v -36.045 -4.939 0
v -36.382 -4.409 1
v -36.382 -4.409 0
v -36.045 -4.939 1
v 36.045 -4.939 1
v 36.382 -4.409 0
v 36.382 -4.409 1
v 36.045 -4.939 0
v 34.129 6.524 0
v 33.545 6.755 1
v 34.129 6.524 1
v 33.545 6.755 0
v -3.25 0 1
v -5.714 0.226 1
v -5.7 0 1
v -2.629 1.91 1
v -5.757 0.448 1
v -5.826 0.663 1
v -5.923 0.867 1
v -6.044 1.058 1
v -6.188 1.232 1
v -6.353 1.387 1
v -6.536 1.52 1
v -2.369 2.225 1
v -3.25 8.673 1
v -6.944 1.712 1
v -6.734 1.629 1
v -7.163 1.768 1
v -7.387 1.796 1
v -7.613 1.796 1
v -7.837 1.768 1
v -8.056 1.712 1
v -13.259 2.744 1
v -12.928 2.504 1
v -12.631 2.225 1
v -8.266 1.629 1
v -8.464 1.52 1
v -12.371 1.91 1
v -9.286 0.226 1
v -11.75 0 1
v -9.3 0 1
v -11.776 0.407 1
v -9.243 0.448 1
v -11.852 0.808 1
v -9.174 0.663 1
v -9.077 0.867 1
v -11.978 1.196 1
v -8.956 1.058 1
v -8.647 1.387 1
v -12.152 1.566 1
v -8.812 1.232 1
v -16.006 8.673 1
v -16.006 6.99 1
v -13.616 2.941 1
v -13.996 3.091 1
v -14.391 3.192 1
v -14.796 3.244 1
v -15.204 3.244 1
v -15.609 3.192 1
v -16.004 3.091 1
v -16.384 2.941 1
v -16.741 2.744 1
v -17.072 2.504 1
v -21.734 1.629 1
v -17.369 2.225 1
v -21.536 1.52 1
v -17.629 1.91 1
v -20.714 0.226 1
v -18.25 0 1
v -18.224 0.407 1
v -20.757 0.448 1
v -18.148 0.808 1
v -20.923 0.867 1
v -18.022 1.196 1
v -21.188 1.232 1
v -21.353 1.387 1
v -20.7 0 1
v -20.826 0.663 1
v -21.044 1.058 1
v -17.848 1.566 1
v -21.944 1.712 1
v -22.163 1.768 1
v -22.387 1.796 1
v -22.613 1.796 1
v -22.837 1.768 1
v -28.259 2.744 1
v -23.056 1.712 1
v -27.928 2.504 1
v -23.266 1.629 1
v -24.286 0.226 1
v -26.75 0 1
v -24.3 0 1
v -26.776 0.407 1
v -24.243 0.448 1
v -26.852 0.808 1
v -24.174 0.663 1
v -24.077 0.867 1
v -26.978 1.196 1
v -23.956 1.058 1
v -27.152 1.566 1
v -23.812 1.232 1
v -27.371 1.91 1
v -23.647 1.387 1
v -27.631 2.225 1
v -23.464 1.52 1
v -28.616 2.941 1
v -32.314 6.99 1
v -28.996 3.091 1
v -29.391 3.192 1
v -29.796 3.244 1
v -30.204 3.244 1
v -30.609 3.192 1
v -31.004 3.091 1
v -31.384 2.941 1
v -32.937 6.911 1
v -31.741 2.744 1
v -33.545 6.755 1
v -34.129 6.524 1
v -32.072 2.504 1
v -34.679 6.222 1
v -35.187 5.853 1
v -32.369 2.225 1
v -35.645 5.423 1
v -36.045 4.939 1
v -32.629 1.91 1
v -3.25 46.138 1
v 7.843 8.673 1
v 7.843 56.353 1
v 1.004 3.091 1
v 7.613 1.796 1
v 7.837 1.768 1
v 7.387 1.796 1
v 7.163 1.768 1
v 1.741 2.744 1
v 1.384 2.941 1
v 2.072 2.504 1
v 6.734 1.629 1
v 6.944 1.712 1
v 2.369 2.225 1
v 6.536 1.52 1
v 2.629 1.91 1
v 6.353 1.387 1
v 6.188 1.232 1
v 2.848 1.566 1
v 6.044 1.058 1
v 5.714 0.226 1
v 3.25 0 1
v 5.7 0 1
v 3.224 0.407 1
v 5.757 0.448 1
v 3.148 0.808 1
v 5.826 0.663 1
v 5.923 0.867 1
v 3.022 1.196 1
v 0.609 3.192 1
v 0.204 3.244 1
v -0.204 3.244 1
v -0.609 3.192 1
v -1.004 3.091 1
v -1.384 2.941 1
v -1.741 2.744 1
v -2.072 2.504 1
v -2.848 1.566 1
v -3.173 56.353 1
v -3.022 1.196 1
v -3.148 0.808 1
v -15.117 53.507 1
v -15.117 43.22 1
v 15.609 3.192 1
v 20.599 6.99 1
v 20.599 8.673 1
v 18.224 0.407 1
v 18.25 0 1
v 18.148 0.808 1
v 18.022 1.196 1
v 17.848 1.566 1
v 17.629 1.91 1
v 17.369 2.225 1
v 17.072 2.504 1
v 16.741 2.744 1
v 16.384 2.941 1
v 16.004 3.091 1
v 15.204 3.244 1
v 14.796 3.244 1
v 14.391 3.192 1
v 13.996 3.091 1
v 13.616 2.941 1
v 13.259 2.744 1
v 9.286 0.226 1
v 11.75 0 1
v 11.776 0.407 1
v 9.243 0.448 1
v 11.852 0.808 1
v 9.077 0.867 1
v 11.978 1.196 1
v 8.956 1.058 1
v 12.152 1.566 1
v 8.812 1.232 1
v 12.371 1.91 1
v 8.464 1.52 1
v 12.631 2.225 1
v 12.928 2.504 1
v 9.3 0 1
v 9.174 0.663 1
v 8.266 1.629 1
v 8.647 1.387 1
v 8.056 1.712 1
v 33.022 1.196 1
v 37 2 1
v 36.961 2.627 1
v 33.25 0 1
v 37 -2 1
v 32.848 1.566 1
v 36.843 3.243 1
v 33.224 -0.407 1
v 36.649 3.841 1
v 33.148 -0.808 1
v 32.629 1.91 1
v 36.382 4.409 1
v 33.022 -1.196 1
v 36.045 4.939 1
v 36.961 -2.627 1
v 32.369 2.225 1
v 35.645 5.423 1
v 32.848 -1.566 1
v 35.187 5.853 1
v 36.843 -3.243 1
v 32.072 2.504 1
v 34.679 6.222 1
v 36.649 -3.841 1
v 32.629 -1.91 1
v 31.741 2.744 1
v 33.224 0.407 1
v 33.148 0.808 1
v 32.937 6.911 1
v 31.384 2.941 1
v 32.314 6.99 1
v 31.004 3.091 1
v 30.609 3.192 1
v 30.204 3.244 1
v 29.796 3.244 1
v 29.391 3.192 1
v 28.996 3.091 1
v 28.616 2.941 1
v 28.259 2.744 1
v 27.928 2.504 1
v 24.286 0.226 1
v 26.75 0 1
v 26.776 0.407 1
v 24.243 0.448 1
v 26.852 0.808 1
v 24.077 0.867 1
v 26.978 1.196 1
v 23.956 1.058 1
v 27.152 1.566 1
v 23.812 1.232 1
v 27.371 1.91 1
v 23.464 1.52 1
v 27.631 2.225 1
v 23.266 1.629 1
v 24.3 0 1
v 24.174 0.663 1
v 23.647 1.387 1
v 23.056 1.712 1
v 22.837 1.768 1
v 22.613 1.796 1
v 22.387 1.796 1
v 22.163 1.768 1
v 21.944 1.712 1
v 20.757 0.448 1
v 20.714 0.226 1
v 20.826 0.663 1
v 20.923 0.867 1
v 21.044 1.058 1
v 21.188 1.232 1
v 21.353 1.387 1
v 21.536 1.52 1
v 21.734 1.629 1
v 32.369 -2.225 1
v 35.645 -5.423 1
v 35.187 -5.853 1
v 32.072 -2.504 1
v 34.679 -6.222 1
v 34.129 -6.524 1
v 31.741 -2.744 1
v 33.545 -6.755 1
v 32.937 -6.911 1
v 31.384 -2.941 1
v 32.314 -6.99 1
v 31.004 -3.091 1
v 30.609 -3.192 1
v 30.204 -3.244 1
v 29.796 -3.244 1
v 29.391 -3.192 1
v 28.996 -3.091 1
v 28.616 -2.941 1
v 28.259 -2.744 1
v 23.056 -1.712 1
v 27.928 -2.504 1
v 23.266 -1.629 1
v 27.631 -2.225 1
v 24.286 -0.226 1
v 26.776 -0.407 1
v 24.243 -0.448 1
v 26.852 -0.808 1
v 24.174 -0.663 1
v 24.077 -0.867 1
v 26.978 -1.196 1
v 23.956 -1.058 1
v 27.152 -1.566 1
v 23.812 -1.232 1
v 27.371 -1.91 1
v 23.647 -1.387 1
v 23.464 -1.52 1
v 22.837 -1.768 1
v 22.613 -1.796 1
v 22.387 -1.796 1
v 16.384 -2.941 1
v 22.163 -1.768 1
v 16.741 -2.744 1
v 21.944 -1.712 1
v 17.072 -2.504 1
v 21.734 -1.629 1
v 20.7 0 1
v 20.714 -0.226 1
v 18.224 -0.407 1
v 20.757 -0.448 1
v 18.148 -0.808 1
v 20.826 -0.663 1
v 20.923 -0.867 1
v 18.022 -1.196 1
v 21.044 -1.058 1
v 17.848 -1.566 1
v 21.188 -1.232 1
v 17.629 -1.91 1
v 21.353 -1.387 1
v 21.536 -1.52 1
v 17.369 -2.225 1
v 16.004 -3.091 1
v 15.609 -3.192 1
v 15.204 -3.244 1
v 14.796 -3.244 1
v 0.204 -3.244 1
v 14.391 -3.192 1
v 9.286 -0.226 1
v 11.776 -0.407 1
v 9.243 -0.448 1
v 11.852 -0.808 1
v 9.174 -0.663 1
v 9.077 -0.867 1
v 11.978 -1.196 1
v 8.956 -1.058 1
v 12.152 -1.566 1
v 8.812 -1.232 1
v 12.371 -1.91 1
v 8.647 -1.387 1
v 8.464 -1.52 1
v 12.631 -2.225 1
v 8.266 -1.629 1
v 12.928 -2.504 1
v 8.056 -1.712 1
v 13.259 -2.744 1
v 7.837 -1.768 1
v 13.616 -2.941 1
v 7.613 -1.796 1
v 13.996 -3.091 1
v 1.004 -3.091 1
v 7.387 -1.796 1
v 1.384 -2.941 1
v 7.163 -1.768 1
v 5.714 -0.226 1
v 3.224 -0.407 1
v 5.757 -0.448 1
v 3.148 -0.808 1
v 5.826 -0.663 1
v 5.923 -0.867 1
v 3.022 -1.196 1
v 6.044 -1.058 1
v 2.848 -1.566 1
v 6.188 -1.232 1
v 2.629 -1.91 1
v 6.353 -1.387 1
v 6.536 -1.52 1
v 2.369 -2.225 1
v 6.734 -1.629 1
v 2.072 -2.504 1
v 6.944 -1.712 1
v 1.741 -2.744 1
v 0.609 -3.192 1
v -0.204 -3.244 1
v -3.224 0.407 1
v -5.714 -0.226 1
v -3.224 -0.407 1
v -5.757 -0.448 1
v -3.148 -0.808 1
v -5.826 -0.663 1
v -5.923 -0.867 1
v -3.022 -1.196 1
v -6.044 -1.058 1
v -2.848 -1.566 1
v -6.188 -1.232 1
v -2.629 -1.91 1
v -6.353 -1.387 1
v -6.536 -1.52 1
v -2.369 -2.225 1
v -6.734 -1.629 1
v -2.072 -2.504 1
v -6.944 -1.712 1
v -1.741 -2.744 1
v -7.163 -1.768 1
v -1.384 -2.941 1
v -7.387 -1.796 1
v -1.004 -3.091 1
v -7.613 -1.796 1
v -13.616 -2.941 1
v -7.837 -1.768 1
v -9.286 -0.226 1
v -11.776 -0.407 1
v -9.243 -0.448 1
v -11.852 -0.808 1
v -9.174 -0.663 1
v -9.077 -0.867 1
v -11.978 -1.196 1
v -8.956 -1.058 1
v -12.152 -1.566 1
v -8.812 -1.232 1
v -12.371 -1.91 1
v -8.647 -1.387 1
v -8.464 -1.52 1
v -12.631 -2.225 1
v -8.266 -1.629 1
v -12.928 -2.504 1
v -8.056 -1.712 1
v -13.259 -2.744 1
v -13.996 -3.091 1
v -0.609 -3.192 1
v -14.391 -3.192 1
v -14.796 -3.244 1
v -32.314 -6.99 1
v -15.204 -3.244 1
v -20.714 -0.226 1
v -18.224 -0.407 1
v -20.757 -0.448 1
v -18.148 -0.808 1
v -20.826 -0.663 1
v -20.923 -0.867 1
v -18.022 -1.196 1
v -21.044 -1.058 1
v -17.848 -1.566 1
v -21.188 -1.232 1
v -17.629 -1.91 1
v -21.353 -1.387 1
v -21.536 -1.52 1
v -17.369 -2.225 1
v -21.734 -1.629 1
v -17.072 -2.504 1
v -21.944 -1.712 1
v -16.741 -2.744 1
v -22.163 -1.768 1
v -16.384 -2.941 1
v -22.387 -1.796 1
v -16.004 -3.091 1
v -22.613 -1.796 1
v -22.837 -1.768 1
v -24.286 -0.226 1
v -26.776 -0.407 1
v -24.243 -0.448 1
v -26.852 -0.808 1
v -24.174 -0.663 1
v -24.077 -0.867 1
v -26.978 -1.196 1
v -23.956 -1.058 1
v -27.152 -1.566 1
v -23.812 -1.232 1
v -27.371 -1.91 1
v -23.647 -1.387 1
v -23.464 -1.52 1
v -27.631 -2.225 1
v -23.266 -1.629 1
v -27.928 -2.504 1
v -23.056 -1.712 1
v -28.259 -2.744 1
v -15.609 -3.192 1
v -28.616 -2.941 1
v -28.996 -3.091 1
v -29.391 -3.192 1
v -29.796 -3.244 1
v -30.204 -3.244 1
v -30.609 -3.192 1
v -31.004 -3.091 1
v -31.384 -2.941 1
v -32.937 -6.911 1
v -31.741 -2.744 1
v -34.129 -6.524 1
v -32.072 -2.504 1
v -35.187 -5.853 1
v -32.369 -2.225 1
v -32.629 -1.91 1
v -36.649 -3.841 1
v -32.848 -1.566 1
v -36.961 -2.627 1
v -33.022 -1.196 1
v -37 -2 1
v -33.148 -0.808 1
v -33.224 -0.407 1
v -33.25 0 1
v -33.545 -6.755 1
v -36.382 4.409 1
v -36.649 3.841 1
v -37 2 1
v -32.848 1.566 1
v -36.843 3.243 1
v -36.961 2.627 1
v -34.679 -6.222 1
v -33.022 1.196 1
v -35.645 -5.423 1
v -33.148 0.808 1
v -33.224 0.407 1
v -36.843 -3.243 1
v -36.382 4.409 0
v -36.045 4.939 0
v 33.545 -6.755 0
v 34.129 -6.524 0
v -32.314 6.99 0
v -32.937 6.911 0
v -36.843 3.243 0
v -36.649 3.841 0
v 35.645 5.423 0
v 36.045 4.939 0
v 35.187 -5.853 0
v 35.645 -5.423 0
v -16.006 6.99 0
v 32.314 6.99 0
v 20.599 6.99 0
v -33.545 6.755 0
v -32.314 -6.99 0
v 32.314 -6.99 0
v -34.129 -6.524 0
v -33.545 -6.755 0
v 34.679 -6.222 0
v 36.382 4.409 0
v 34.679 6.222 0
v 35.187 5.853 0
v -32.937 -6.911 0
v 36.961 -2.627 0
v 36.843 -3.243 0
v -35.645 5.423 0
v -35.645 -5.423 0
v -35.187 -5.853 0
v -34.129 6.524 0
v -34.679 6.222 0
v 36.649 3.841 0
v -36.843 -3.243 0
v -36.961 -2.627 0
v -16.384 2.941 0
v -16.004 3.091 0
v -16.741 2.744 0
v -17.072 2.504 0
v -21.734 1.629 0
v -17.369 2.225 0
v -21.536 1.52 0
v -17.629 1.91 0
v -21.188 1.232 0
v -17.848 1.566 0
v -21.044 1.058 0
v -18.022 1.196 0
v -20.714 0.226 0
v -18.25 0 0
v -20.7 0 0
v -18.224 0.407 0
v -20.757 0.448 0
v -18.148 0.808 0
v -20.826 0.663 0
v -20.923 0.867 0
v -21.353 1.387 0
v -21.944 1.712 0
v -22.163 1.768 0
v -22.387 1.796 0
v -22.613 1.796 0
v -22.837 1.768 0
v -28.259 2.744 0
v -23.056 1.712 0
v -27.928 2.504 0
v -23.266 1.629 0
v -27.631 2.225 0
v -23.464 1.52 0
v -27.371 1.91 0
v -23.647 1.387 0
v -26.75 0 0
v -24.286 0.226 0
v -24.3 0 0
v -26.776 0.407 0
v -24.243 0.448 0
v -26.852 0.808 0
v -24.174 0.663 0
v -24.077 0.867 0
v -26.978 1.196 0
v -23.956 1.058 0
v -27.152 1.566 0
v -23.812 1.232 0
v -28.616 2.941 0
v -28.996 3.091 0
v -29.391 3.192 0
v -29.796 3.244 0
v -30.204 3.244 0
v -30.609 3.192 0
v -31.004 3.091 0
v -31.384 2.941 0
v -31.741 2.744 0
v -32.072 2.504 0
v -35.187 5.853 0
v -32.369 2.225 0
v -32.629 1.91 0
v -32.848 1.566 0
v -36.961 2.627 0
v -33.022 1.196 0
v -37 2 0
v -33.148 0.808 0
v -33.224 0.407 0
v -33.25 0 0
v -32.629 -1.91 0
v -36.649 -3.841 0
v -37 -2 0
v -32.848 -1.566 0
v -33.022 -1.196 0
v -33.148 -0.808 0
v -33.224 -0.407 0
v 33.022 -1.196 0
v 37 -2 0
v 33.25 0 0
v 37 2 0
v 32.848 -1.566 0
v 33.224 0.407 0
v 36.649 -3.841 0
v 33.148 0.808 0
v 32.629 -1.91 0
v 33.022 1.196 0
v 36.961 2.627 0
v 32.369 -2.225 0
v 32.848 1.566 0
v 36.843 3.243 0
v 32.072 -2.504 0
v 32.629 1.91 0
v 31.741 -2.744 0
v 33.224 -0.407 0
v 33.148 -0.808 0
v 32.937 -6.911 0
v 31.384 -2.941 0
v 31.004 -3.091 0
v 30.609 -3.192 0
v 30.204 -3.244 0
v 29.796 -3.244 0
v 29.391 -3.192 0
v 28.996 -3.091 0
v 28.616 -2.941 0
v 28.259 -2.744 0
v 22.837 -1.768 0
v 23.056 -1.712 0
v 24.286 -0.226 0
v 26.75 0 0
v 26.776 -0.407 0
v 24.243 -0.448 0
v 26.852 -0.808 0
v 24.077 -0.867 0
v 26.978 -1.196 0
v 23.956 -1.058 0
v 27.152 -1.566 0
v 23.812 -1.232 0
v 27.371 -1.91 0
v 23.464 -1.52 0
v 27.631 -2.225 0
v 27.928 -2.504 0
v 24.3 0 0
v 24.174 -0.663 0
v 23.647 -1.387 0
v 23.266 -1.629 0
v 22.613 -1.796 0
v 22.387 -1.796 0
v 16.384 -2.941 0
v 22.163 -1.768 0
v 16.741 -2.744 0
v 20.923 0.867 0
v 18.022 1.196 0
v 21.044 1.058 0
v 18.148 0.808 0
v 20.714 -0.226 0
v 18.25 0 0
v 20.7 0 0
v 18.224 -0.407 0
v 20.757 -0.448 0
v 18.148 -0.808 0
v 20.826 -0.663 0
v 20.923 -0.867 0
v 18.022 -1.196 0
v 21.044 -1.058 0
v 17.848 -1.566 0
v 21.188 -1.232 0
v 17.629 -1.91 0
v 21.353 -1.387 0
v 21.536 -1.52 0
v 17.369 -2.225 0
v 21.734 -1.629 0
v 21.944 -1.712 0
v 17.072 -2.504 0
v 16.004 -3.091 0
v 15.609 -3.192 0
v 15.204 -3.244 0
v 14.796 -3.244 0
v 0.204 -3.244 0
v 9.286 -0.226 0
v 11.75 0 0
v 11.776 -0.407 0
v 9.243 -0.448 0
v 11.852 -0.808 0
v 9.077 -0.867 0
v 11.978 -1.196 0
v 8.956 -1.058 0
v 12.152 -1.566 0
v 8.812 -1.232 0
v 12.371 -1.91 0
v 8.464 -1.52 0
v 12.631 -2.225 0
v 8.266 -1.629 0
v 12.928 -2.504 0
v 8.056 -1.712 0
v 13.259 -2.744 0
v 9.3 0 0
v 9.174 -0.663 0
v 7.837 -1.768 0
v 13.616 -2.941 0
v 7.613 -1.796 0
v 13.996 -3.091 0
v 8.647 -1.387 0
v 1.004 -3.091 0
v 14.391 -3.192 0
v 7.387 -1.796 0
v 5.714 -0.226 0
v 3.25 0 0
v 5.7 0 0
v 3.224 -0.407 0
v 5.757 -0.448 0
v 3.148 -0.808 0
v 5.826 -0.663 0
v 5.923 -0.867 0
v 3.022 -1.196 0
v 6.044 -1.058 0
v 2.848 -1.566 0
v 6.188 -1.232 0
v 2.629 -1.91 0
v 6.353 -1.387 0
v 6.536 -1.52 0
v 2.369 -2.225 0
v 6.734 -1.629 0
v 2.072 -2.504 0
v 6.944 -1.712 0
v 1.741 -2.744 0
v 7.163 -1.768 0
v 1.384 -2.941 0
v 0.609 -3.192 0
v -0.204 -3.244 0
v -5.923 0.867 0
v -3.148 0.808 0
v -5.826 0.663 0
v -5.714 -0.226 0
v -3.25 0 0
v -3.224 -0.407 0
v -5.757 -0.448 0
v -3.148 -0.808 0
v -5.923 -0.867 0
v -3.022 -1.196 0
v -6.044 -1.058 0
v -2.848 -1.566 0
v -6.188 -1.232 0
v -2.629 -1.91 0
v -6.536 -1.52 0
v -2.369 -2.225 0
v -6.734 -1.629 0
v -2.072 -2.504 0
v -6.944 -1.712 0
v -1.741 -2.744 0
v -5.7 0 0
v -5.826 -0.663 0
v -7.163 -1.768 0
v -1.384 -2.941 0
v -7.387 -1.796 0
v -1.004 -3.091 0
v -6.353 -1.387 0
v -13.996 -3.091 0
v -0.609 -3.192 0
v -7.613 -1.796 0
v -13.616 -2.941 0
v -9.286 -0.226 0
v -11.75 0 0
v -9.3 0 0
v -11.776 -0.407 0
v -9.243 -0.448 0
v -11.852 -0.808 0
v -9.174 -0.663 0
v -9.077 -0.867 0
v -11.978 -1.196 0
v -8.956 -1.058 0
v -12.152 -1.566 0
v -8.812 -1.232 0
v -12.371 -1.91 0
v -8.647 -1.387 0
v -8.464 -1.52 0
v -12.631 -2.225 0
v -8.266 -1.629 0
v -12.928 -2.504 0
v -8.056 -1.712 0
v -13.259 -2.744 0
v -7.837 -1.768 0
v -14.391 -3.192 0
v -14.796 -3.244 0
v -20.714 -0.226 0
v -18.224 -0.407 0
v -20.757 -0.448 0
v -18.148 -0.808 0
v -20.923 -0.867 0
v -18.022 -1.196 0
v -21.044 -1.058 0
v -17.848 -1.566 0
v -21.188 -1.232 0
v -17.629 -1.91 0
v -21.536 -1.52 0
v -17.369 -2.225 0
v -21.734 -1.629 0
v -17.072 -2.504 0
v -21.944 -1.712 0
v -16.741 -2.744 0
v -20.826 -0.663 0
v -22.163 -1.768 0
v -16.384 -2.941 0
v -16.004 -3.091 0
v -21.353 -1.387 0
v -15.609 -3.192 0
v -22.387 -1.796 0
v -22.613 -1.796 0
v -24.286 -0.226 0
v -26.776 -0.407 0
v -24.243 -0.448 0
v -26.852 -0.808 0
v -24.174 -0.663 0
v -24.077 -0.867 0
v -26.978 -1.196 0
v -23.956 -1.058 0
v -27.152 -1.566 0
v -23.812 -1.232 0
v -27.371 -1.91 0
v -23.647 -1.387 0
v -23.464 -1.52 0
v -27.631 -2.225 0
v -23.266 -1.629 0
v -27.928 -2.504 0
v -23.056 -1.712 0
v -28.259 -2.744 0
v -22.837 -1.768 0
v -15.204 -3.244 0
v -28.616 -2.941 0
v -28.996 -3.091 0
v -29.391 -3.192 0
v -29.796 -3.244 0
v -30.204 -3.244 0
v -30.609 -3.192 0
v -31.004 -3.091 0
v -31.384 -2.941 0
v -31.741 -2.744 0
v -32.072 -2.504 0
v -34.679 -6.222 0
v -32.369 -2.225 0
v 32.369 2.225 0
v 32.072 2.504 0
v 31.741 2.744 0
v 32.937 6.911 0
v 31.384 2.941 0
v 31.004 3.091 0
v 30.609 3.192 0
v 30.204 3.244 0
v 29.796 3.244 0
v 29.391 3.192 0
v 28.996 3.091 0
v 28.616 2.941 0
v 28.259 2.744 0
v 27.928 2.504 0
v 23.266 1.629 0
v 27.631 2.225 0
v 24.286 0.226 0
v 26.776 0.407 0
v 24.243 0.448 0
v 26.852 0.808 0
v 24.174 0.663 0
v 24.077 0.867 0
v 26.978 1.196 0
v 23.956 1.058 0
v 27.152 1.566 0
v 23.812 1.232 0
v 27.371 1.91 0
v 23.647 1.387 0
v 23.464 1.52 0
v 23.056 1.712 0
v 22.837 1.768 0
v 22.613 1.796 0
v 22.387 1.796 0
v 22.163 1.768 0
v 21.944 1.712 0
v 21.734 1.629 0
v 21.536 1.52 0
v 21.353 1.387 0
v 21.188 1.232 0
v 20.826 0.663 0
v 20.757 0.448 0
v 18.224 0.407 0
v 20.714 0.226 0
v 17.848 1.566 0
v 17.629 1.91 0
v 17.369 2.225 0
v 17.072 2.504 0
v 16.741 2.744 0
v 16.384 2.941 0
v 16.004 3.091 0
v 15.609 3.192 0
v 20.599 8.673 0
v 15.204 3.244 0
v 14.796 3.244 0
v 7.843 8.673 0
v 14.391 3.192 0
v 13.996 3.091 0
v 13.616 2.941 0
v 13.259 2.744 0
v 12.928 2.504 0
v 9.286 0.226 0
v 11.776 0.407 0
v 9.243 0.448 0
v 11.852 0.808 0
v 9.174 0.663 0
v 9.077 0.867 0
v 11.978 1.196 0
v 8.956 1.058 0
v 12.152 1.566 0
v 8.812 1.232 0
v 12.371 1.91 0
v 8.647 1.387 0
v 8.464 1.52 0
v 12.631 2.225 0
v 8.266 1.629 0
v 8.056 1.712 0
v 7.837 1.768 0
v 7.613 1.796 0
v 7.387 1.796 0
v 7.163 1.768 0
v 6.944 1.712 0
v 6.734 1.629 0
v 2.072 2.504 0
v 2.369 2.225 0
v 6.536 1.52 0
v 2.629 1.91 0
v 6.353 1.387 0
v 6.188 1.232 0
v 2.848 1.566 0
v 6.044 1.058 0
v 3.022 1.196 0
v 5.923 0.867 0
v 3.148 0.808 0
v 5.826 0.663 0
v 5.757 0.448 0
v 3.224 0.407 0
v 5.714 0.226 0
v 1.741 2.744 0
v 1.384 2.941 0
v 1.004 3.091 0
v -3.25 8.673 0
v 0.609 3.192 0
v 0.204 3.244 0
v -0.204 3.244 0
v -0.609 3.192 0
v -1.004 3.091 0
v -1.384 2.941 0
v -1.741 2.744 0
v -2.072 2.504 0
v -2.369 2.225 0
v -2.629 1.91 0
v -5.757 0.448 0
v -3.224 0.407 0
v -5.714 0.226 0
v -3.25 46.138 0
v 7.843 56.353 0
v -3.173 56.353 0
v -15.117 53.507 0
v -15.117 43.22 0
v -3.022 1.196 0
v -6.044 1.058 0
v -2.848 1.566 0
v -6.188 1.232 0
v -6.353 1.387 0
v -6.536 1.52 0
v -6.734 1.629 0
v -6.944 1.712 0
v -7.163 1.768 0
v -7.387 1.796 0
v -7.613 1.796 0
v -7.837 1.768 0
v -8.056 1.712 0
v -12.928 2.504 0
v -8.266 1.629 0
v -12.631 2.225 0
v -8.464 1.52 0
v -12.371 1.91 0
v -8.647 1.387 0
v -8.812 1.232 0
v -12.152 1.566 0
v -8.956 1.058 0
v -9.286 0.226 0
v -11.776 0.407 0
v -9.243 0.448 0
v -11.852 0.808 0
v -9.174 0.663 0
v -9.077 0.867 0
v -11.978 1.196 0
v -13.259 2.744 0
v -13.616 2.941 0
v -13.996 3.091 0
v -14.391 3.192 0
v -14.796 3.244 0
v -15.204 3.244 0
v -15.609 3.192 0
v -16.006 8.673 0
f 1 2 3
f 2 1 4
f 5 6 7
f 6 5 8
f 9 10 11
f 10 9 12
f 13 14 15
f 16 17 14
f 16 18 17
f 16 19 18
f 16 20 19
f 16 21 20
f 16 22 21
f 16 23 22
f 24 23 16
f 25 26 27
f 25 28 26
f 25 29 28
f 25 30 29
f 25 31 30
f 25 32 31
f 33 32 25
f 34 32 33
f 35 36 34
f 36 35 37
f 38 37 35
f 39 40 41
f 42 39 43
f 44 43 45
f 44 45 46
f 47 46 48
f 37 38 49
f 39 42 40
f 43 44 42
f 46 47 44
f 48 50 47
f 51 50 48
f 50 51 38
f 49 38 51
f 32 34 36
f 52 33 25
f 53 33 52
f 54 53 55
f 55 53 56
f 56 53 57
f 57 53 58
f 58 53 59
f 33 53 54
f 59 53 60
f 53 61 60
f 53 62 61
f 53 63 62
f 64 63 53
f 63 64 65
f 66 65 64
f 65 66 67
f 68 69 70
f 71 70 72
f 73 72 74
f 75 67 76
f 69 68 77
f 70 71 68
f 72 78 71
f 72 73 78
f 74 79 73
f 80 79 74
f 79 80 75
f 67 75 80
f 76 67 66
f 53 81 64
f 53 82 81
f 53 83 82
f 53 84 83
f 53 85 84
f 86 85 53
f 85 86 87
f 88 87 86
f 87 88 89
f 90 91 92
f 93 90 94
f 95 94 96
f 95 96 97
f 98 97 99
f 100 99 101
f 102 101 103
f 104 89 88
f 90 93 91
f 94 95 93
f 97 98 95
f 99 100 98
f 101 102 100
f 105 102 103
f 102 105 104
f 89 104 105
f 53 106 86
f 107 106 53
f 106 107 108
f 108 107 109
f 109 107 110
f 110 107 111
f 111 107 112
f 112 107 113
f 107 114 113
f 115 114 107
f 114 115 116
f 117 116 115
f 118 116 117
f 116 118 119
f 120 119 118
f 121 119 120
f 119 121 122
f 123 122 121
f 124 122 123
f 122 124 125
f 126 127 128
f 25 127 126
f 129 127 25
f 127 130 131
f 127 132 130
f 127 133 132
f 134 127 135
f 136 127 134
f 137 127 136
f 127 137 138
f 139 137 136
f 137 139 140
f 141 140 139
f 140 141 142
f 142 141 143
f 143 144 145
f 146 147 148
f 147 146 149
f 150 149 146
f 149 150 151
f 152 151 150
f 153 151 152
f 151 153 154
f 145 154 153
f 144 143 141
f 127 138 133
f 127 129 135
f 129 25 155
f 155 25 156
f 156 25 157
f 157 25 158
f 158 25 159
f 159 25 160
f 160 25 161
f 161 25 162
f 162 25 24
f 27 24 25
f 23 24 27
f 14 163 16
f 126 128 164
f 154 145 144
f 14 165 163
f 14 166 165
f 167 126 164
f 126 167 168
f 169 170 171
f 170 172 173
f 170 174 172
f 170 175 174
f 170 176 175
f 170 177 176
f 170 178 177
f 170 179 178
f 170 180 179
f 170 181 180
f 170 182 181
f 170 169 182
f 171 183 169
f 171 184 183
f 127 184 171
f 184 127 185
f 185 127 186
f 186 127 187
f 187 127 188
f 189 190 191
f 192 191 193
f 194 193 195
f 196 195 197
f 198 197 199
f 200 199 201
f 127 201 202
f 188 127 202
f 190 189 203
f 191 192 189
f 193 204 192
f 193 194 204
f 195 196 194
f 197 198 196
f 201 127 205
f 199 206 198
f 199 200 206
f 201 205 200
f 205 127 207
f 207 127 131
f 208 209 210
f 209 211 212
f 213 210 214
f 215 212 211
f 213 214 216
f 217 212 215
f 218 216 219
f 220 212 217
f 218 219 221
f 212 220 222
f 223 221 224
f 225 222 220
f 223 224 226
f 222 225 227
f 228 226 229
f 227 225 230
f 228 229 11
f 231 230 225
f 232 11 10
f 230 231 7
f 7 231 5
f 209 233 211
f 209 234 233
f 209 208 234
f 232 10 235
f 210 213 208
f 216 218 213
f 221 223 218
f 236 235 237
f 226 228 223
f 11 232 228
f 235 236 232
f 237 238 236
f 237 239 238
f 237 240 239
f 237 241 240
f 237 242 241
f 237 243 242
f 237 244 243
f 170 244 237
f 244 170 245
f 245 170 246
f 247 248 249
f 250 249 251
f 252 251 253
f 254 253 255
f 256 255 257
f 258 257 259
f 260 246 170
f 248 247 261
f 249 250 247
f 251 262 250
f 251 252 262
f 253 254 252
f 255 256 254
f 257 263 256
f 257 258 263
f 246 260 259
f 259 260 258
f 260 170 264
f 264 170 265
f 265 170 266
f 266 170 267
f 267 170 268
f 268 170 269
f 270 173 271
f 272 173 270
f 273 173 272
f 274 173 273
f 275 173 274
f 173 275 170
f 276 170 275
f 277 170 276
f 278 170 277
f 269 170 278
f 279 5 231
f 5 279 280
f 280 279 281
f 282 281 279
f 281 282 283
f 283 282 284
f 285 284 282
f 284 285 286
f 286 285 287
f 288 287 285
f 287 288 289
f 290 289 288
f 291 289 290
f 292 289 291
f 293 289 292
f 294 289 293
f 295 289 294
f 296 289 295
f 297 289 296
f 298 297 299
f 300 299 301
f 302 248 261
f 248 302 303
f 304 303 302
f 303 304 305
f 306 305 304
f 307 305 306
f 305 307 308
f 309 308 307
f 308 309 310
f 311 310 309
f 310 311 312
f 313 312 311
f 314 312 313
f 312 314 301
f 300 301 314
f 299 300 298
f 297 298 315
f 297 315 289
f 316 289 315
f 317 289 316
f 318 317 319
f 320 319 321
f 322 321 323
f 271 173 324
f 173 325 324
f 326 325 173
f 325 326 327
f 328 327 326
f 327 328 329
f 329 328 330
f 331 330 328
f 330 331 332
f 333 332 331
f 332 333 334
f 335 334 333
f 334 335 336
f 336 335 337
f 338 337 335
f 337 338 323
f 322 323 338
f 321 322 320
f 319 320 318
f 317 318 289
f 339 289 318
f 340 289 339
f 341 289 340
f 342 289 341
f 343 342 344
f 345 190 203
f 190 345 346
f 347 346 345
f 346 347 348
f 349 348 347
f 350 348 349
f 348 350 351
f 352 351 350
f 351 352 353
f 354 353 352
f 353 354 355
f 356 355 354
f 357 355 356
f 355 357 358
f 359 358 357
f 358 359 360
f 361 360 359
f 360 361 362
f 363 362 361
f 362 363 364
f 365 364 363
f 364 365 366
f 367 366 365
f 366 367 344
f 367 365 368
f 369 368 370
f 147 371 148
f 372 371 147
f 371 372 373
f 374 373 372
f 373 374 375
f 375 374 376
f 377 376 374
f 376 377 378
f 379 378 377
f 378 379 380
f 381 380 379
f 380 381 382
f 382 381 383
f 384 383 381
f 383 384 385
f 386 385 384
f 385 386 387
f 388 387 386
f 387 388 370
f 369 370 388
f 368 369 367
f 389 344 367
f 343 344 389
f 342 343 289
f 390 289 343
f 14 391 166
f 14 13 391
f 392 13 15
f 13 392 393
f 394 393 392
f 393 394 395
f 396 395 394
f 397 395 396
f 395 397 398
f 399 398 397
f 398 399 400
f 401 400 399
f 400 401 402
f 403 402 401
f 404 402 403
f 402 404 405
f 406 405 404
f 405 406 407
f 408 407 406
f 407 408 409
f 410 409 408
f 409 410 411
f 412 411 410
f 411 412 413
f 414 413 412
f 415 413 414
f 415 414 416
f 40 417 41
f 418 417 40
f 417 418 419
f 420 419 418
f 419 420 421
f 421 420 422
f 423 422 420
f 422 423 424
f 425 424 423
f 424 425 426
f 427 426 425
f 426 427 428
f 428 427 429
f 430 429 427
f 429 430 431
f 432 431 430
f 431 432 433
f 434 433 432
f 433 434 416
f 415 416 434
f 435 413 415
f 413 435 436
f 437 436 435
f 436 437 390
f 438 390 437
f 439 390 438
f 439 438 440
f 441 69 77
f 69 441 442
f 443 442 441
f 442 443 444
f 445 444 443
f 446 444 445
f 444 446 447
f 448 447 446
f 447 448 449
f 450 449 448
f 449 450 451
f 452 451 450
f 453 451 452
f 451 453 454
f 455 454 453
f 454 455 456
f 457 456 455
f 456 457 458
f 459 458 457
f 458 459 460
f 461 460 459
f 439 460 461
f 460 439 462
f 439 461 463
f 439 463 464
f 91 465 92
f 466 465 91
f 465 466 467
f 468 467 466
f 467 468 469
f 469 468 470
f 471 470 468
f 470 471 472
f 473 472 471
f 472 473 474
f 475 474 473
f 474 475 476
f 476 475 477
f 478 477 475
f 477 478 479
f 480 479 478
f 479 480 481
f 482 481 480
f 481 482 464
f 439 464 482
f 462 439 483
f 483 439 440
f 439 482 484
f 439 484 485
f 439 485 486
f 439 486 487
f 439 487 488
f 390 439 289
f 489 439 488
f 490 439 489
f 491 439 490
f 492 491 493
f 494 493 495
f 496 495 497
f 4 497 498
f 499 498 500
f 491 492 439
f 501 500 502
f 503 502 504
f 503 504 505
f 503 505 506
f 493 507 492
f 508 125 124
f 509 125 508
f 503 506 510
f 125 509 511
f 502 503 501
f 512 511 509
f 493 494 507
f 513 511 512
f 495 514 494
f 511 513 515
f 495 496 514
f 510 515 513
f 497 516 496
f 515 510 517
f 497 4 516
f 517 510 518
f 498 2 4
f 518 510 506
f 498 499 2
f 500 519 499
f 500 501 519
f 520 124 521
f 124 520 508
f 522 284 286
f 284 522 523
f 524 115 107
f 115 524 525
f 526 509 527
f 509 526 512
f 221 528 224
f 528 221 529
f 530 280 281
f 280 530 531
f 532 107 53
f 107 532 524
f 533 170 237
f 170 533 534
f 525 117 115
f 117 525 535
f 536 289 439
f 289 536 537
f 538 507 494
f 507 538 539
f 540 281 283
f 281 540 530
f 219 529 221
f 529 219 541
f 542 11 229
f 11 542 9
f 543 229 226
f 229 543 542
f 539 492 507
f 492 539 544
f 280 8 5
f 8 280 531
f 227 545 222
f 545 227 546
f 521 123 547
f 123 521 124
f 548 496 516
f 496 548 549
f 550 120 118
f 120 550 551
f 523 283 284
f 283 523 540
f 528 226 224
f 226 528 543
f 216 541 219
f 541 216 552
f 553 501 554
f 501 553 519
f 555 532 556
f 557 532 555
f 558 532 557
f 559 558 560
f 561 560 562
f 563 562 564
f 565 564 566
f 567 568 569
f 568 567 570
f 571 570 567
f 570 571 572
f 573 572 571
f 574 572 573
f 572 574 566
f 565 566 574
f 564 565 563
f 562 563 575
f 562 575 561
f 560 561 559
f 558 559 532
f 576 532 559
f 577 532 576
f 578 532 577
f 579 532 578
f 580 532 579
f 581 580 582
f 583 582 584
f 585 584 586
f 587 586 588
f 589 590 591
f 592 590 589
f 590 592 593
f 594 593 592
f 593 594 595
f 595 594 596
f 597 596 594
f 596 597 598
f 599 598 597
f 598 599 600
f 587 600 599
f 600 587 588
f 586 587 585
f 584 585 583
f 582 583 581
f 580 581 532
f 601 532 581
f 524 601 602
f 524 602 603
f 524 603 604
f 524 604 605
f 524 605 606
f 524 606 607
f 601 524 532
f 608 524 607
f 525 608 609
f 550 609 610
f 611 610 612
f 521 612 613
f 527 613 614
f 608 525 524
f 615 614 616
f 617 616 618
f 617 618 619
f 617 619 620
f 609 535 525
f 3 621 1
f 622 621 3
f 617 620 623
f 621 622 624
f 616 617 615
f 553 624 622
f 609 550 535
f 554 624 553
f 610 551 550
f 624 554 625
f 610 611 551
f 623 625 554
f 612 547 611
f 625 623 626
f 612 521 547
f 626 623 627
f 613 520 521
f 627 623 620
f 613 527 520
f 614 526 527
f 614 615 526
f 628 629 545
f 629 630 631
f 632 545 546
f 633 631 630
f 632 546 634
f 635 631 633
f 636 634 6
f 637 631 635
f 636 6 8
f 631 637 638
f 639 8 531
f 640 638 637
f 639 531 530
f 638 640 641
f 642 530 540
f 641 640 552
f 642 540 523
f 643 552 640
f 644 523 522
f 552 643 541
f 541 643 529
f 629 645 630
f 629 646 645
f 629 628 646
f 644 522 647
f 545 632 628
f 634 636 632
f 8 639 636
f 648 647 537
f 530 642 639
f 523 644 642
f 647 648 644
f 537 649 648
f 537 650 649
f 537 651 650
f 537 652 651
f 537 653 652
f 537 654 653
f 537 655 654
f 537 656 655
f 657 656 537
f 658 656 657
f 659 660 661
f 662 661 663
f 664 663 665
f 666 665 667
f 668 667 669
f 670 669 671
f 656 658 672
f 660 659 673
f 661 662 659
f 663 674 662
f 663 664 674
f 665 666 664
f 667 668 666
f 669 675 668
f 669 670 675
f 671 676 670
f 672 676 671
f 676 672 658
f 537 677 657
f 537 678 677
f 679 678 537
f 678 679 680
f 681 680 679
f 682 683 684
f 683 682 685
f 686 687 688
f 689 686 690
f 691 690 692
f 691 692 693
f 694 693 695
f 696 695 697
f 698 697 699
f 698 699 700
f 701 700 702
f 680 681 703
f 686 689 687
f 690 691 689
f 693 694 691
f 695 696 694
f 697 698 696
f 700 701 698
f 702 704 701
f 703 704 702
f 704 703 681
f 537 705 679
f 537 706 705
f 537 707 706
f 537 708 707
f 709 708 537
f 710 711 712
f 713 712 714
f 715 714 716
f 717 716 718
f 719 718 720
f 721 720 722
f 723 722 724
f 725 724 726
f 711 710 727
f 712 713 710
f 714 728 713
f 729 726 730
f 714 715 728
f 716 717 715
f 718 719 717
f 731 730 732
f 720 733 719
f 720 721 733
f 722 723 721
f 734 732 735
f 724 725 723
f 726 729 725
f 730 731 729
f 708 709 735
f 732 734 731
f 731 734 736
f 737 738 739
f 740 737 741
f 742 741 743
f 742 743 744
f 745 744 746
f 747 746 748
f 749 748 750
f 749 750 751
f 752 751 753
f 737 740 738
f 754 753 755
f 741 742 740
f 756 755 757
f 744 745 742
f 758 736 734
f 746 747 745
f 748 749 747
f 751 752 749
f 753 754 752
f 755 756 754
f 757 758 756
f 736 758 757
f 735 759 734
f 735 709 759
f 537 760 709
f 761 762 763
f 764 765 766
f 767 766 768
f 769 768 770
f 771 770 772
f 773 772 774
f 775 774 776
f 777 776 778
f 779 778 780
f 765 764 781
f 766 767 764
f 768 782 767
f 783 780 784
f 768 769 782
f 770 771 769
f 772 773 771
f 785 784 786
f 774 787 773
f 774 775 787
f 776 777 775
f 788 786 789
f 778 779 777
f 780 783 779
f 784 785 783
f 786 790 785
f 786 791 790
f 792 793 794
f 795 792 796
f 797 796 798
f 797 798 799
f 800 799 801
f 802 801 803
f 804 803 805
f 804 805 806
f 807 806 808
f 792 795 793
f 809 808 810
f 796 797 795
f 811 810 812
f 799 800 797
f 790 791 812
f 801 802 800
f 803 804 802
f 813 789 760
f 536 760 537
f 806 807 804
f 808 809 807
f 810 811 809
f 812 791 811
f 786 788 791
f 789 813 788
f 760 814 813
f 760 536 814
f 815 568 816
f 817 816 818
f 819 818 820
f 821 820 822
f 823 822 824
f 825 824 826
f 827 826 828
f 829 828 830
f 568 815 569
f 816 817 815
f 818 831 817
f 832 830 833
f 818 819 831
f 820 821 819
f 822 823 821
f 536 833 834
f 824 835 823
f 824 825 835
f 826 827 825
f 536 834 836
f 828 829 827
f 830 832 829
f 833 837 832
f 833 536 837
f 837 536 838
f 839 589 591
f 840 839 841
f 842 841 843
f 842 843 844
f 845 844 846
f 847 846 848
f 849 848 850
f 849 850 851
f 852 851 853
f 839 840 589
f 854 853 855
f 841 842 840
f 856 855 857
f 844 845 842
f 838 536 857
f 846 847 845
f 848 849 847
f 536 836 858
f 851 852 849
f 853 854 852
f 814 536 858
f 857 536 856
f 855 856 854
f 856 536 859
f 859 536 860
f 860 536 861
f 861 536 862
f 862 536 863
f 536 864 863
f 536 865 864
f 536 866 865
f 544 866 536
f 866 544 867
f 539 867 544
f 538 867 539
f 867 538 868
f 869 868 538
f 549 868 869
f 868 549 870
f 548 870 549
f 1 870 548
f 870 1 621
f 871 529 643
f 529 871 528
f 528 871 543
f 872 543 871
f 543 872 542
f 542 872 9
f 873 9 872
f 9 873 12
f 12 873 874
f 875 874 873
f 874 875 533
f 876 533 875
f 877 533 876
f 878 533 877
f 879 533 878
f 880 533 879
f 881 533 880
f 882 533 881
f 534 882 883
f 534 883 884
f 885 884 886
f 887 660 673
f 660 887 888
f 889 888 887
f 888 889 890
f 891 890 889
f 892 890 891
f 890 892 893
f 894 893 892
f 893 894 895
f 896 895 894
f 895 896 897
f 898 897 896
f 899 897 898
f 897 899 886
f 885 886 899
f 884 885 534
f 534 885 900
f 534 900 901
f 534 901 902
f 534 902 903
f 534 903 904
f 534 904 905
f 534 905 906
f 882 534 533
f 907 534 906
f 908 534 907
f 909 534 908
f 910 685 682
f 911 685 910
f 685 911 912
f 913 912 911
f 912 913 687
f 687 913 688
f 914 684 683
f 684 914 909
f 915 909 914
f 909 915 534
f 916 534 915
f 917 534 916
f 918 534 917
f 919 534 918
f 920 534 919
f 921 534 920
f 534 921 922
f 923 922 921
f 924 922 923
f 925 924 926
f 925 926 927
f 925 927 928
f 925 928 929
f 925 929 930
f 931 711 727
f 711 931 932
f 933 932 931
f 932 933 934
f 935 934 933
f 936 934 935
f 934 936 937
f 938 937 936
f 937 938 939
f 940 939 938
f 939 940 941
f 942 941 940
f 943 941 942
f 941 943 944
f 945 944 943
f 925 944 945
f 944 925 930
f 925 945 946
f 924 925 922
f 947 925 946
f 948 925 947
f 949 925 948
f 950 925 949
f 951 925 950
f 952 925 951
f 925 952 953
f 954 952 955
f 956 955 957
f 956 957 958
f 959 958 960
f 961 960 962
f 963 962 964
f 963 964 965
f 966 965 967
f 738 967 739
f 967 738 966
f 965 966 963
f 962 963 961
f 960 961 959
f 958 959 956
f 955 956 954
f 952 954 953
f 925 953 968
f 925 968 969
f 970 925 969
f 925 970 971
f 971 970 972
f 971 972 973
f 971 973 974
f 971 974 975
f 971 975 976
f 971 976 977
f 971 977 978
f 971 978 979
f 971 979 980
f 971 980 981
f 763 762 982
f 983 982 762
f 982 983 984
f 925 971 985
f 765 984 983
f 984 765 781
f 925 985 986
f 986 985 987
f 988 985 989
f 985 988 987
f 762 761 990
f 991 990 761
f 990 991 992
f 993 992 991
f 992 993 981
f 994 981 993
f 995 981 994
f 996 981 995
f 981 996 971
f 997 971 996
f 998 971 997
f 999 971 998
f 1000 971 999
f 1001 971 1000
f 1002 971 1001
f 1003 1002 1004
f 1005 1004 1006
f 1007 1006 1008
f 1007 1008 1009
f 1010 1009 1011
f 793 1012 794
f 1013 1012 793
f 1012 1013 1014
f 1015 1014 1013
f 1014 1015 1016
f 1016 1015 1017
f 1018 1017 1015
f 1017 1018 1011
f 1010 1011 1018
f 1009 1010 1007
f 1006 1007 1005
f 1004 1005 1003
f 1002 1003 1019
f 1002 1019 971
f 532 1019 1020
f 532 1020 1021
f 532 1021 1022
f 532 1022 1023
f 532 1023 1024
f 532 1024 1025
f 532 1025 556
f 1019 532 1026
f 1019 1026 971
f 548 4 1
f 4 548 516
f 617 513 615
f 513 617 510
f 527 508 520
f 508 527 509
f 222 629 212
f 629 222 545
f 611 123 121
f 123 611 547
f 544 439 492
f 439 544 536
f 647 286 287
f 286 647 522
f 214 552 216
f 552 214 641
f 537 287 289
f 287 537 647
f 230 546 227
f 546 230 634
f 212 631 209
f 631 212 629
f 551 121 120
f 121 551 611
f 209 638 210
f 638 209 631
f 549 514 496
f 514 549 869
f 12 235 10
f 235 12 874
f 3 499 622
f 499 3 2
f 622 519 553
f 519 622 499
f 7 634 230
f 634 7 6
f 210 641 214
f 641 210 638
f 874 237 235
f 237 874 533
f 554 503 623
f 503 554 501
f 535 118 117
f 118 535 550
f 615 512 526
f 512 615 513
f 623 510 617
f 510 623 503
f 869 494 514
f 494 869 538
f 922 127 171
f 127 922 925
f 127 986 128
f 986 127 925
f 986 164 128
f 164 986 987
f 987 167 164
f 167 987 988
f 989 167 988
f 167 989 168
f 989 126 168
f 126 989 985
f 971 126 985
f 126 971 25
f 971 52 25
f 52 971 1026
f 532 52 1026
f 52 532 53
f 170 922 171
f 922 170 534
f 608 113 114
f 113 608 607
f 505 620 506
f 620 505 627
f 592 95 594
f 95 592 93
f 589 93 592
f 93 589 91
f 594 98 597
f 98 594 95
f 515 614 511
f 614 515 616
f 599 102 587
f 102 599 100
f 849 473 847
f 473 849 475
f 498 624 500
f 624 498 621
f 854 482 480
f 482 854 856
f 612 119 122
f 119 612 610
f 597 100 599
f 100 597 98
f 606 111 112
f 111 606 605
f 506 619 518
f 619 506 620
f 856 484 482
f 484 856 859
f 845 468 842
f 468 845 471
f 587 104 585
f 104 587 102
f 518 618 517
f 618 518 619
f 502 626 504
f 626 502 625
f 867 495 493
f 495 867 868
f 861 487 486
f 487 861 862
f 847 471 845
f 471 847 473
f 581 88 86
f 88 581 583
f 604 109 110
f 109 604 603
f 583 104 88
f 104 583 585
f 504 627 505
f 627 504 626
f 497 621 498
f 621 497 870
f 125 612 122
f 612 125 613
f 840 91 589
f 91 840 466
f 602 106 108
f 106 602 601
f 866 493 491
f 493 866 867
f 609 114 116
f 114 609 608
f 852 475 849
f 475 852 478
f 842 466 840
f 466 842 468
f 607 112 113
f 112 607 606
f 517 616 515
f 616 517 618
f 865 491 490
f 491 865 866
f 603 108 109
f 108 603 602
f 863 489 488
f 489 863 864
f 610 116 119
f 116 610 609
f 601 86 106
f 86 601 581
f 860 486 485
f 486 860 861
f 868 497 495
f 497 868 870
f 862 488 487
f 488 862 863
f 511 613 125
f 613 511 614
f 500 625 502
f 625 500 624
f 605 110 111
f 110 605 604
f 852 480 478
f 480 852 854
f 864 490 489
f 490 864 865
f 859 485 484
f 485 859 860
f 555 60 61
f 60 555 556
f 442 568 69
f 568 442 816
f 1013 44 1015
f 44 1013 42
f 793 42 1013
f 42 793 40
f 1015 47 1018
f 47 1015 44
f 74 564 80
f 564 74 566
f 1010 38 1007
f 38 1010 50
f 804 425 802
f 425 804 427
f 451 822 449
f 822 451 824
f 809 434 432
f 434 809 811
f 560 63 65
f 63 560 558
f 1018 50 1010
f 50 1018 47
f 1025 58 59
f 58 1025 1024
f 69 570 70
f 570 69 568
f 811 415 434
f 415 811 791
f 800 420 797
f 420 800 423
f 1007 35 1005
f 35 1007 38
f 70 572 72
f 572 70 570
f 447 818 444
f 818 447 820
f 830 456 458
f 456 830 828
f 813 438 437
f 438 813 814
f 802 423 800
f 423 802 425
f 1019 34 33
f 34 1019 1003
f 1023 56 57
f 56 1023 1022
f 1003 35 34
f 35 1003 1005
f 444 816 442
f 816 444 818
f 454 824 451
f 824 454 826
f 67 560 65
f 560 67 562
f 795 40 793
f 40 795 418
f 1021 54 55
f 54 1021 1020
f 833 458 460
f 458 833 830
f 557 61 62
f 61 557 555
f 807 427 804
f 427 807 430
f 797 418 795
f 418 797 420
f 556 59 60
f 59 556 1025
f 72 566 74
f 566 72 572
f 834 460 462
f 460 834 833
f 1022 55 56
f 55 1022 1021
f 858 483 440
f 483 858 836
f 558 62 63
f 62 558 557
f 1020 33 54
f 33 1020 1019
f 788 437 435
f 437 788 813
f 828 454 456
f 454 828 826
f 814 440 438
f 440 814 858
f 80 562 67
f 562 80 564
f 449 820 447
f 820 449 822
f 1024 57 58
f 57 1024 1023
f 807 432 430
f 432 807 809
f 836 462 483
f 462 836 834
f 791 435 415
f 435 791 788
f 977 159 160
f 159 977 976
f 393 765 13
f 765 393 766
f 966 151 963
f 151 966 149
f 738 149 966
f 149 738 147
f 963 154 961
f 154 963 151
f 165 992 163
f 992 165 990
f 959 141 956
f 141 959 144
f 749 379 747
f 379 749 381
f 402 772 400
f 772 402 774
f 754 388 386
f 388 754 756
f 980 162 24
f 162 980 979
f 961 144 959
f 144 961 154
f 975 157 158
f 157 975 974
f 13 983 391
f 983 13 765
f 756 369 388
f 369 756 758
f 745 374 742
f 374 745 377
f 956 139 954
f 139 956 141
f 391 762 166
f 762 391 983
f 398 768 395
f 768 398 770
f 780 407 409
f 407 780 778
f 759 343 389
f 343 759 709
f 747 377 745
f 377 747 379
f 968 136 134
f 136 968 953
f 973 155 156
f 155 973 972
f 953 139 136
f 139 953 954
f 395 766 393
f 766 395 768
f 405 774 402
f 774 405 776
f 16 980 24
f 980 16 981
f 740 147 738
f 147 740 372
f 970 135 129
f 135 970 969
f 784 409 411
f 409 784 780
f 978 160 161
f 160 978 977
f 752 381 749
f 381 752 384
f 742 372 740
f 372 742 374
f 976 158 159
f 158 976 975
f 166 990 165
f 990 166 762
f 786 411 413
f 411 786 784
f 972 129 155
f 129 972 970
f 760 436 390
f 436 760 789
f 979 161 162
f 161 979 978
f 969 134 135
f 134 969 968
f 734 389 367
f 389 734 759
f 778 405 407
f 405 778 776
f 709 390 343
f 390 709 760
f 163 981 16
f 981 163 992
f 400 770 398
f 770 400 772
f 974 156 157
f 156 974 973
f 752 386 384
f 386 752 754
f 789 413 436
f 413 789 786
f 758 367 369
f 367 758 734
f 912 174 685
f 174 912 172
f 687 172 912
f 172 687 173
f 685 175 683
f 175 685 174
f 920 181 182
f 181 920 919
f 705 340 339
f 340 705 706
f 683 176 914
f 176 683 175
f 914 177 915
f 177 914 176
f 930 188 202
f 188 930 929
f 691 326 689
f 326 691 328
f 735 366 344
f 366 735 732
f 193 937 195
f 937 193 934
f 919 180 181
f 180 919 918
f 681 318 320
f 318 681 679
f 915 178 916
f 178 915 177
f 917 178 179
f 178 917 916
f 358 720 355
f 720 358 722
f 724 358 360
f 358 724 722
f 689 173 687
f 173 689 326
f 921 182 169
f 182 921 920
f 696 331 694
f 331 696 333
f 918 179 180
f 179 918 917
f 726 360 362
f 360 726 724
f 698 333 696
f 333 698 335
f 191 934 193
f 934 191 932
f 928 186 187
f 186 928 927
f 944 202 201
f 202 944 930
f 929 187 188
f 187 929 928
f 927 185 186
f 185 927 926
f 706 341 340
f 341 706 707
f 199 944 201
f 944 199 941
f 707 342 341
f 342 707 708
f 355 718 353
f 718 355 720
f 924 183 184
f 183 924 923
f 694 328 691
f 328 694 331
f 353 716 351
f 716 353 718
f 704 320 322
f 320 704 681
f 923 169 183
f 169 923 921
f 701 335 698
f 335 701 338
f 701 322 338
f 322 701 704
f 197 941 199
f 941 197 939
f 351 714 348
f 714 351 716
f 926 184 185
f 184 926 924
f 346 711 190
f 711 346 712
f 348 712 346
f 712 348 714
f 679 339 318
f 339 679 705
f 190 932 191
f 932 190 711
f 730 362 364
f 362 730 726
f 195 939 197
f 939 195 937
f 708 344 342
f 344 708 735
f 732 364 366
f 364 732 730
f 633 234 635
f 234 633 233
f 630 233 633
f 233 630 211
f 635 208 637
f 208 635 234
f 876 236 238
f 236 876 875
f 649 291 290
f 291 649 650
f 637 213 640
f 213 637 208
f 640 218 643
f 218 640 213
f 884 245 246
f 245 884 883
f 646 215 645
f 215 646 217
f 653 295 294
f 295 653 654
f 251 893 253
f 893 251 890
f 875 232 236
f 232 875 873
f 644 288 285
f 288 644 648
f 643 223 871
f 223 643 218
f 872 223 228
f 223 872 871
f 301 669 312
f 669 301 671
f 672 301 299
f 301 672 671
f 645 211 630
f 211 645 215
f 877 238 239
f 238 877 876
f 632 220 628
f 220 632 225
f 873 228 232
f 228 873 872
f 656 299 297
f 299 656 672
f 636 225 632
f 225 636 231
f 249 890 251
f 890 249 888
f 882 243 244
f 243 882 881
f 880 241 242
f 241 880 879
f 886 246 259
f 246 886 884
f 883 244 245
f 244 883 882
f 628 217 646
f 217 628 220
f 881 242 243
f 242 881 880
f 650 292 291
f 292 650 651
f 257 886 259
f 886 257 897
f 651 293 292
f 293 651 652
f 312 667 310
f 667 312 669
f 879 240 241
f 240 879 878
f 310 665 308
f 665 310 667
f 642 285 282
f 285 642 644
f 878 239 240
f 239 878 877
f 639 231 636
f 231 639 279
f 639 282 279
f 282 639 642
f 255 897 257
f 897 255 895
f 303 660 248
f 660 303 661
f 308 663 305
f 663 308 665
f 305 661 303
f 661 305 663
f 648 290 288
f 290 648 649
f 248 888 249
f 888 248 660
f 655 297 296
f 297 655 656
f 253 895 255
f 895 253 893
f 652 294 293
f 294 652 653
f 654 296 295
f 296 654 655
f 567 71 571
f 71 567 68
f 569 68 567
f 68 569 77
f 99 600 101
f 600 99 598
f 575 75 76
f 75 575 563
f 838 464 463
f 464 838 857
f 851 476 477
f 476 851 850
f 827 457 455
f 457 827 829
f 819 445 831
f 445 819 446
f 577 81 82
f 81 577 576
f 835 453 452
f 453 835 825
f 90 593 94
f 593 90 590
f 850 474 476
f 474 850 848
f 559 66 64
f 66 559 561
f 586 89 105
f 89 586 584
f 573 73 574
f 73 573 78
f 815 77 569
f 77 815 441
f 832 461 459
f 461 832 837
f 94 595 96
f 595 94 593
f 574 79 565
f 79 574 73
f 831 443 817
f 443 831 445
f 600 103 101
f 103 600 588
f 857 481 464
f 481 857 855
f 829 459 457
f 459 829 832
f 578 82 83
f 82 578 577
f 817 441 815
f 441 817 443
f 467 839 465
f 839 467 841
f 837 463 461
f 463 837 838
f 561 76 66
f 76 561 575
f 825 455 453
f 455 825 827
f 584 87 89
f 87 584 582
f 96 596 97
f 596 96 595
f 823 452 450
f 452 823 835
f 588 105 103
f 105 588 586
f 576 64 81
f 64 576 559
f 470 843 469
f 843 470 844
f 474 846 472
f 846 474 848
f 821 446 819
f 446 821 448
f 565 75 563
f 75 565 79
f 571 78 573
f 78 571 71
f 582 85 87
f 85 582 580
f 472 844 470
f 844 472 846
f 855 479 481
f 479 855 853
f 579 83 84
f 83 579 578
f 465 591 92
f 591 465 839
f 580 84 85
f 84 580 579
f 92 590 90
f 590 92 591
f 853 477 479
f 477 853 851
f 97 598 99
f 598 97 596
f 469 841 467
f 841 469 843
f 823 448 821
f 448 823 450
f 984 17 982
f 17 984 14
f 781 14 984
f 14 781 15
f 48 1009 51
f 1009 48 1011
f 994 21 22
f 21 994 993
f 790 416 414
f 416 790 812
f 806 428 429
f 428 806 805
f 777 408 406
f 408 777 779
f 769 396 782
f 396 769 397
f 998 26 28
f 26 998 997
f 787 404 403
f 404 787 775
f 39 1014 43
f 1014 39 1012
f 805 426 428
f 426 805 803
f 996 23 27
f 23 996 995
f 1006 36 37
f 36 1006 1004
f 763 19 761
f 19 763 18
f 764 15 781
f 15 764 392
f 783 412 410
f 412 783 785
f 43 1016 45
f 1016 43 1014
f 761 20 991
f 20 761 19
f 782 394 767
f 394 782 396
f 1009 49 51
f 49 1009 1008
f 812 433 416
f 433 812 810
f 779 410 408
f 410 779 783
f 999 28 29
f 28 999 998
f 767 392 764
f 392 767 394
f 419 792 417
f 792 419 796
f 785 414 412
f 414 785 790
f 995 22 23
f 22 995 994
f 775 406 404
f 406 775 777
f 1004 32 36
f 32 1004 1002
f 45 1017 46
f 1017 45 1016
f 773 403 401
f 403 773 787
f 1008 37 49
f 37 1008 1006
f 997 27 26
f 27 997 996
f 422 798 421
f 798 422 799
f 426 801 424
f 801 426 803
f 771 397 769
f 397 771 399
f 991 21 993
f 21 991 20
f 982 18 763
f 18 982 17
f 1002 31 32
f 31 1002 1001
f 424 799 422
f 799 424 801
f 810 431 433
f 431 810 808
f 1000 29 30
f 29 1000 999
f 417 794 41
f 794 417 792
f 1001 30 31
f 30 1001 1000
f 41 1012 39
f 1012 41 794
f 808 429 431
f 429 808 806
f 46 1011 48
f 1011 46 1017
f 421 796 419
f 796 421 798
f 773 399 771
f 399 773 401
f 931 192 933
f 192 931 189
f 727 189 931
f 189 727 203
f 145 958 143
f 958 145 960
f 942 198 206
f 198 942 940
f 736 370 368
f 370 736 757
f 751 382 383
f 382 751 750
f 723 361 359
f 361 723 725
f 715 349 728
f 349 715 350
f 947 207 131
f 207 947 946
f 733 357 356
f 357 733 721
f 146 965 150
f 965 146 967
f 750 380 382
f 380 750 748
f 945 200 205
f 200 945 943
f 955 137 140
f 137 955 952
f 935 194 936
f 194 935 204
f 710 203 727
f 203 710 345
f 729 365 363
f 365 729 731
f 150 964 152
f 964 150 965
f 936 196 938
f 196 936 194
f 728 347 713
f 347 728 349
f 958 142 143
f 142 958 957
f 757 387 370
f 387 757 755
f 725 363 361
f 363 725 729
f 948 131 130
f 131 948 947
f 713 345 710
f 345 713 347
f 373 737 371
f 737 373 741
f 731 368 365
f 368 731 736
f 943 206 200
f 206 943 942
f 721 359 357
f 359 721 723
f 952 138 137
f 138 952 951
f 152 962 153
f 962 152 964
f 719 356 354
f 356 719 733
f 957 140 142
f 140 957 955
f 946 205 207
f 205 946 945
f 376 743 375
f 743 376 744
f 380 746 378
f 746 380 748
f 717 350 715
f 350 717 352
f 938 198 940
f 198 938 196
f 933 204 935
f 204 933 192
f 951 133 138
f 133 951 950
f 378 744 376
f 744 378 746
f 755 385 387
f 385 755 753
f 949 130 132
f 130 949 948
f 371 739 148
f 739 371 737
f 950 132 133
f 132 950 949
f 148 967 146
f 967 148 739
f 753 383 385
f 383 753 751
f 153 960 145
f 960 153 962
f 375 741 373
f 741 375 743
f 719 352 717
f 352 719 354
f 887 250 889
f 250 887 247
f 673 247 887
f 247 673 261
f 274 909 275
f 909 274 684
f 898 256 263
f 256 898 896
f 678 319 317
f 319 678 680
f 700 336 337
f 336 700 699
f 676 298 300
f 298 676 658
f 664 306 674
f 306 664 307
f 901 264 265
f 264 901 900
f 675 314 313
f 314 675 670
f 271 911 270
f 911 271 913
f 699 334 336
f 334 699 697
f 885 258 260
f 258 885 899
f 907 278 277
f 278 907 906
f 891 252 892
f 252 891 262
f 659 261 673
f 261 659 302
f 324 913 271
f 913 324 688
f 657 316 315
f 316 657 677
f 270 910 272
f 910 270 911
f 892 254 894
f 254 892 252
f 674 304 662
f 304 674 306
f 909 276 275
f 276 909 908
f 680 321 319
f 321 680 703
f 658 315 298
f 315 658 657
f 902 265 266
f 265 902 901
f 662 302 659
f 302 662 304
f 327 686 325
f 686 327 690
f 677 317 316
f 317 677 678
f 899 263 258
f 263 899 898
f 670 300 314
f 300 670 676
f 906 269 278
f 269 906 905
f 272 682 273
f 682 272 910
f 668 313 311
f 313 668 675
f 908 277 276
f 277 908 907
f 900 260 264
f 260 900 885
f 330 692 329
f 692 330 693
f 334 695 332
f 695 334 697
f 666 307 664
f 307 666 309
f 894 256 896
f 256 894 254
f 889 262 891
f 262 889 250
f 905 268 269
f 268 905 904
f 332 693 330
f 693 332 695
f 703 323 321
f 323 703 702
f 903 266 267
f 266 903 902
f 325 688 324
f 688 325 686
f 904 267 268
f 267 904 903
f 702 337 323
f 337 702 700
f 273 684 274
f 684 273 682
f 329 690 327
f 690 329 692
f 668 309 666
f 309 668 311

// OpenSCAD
$fn = 50;


difference() {
	union() {
		hull() {
			translate(v = [-32.0000000000, 2.0000000000, 0]) {
				cylinder(h = 1, r = 5);
			}
			translate(v = [32.0000000000, 2.0000000000, 0]) {
				cylinder(h = 1, r = 5);
			}
			translate(v = [-32.0000000000, -2.0000000000, 0]) {
				cylinder(h = 1, r = 5);
			}
			translate(v = [32.0000000000, -2.0000000000, 0]) {
				cylinder(h = 1, r = 5);
			}
		}
		translate(v = [0, 55, 0]) {
			linear_extrude(height = 1) {
				text(font = "DejaVu Sans Mono:style=Bold", halign = "center", size = 57.0000000000, text = "1", valign = "top");
			}
		}
	}
	union() {
		translate(v = [-30.0000000000, 0.0000000000, 0]) {
			translate(v = [0, 0, -100]) {
				cylinder(h = 200, r = 3.2500000000);
			}
		}
		translate(v = [-15.0000000000, 0.0000000000, 0]) {
			translate(v = [0, 0, -100]) {
				cylinder(h = 200, r = 3.2500000000);
			}
		}
		translate(v = [0, 0, -100]) {
			cylinder(h = 200, r = 3.2500000000);
		}
		translate(v = [15.0000000000, 0.0000000000, 0]) {
			translate(v = [0, 0, -100]) {
				cylinder(h = 200, r = 3.2500000000);
			}
		}
		translate(v = [30.0000000000, 0.0000000000, 0]) {
			translate(v = [0, 0, -100]) {
				cylinder(h = 200, r = 3.2500000000);
			}
		}
		translate(v = [-30.0000000000, 0.0000000000, 0]) {
			translate(v = [0, 0, -100]) {
				cylinder(h = 200, r = 1.8000000000);
			}
		}
		translate(v = [-22.5000000000, 0.0000000000, 0]) {
			translate(v = [0, 0, -100]) {
				cylinder(h = 200, r = 1.8000000000);
			}
		}
		translate(v = [-15.0000000000, 0.0000000000, 0]) {
			translate(v = [0, 0, -100]) {
				cylinder(h = 200, r = 1.8000000000);
			}
		}
		translate(v = [-7.5000000000, 0.0000000000, 0]) {
			translate(v = [0, 0, -100]) {
				cylinder(h = 200, r = 1.8000000000);
			}
		}
		translate(v = [0, 0, -100]) {
			cylinder(h = 200, r = 1.8000000000);
		}
		translate(v = [7.5000000000, 0.0000000000, 0]) {
			translate(v = [0, 0, -100]) {
				cylinder(h = 200, r = 1.8000000000);
			}
		}
		translate(v = [15.0000000000, 0.0000000000, 0]) {
			translate(v = [0, 0, -100]) {
				cylinder(h = 200, r = 1.8000000000);
			}
		}
		translate(v = [22.5000000000, 0.0000000000, 0]) {
			translate(v = [0, 0, -100]) {
				cylinder(h = 200, r = 1.8000000000);
			}
		}
		translate(v = [30.0000000000, 0.0000000000, 0]) {
			translate(v = [0, 0, -100]) {
				cylinder(h = 200, r = 1.8000000000);
			}
		}
	}
}
